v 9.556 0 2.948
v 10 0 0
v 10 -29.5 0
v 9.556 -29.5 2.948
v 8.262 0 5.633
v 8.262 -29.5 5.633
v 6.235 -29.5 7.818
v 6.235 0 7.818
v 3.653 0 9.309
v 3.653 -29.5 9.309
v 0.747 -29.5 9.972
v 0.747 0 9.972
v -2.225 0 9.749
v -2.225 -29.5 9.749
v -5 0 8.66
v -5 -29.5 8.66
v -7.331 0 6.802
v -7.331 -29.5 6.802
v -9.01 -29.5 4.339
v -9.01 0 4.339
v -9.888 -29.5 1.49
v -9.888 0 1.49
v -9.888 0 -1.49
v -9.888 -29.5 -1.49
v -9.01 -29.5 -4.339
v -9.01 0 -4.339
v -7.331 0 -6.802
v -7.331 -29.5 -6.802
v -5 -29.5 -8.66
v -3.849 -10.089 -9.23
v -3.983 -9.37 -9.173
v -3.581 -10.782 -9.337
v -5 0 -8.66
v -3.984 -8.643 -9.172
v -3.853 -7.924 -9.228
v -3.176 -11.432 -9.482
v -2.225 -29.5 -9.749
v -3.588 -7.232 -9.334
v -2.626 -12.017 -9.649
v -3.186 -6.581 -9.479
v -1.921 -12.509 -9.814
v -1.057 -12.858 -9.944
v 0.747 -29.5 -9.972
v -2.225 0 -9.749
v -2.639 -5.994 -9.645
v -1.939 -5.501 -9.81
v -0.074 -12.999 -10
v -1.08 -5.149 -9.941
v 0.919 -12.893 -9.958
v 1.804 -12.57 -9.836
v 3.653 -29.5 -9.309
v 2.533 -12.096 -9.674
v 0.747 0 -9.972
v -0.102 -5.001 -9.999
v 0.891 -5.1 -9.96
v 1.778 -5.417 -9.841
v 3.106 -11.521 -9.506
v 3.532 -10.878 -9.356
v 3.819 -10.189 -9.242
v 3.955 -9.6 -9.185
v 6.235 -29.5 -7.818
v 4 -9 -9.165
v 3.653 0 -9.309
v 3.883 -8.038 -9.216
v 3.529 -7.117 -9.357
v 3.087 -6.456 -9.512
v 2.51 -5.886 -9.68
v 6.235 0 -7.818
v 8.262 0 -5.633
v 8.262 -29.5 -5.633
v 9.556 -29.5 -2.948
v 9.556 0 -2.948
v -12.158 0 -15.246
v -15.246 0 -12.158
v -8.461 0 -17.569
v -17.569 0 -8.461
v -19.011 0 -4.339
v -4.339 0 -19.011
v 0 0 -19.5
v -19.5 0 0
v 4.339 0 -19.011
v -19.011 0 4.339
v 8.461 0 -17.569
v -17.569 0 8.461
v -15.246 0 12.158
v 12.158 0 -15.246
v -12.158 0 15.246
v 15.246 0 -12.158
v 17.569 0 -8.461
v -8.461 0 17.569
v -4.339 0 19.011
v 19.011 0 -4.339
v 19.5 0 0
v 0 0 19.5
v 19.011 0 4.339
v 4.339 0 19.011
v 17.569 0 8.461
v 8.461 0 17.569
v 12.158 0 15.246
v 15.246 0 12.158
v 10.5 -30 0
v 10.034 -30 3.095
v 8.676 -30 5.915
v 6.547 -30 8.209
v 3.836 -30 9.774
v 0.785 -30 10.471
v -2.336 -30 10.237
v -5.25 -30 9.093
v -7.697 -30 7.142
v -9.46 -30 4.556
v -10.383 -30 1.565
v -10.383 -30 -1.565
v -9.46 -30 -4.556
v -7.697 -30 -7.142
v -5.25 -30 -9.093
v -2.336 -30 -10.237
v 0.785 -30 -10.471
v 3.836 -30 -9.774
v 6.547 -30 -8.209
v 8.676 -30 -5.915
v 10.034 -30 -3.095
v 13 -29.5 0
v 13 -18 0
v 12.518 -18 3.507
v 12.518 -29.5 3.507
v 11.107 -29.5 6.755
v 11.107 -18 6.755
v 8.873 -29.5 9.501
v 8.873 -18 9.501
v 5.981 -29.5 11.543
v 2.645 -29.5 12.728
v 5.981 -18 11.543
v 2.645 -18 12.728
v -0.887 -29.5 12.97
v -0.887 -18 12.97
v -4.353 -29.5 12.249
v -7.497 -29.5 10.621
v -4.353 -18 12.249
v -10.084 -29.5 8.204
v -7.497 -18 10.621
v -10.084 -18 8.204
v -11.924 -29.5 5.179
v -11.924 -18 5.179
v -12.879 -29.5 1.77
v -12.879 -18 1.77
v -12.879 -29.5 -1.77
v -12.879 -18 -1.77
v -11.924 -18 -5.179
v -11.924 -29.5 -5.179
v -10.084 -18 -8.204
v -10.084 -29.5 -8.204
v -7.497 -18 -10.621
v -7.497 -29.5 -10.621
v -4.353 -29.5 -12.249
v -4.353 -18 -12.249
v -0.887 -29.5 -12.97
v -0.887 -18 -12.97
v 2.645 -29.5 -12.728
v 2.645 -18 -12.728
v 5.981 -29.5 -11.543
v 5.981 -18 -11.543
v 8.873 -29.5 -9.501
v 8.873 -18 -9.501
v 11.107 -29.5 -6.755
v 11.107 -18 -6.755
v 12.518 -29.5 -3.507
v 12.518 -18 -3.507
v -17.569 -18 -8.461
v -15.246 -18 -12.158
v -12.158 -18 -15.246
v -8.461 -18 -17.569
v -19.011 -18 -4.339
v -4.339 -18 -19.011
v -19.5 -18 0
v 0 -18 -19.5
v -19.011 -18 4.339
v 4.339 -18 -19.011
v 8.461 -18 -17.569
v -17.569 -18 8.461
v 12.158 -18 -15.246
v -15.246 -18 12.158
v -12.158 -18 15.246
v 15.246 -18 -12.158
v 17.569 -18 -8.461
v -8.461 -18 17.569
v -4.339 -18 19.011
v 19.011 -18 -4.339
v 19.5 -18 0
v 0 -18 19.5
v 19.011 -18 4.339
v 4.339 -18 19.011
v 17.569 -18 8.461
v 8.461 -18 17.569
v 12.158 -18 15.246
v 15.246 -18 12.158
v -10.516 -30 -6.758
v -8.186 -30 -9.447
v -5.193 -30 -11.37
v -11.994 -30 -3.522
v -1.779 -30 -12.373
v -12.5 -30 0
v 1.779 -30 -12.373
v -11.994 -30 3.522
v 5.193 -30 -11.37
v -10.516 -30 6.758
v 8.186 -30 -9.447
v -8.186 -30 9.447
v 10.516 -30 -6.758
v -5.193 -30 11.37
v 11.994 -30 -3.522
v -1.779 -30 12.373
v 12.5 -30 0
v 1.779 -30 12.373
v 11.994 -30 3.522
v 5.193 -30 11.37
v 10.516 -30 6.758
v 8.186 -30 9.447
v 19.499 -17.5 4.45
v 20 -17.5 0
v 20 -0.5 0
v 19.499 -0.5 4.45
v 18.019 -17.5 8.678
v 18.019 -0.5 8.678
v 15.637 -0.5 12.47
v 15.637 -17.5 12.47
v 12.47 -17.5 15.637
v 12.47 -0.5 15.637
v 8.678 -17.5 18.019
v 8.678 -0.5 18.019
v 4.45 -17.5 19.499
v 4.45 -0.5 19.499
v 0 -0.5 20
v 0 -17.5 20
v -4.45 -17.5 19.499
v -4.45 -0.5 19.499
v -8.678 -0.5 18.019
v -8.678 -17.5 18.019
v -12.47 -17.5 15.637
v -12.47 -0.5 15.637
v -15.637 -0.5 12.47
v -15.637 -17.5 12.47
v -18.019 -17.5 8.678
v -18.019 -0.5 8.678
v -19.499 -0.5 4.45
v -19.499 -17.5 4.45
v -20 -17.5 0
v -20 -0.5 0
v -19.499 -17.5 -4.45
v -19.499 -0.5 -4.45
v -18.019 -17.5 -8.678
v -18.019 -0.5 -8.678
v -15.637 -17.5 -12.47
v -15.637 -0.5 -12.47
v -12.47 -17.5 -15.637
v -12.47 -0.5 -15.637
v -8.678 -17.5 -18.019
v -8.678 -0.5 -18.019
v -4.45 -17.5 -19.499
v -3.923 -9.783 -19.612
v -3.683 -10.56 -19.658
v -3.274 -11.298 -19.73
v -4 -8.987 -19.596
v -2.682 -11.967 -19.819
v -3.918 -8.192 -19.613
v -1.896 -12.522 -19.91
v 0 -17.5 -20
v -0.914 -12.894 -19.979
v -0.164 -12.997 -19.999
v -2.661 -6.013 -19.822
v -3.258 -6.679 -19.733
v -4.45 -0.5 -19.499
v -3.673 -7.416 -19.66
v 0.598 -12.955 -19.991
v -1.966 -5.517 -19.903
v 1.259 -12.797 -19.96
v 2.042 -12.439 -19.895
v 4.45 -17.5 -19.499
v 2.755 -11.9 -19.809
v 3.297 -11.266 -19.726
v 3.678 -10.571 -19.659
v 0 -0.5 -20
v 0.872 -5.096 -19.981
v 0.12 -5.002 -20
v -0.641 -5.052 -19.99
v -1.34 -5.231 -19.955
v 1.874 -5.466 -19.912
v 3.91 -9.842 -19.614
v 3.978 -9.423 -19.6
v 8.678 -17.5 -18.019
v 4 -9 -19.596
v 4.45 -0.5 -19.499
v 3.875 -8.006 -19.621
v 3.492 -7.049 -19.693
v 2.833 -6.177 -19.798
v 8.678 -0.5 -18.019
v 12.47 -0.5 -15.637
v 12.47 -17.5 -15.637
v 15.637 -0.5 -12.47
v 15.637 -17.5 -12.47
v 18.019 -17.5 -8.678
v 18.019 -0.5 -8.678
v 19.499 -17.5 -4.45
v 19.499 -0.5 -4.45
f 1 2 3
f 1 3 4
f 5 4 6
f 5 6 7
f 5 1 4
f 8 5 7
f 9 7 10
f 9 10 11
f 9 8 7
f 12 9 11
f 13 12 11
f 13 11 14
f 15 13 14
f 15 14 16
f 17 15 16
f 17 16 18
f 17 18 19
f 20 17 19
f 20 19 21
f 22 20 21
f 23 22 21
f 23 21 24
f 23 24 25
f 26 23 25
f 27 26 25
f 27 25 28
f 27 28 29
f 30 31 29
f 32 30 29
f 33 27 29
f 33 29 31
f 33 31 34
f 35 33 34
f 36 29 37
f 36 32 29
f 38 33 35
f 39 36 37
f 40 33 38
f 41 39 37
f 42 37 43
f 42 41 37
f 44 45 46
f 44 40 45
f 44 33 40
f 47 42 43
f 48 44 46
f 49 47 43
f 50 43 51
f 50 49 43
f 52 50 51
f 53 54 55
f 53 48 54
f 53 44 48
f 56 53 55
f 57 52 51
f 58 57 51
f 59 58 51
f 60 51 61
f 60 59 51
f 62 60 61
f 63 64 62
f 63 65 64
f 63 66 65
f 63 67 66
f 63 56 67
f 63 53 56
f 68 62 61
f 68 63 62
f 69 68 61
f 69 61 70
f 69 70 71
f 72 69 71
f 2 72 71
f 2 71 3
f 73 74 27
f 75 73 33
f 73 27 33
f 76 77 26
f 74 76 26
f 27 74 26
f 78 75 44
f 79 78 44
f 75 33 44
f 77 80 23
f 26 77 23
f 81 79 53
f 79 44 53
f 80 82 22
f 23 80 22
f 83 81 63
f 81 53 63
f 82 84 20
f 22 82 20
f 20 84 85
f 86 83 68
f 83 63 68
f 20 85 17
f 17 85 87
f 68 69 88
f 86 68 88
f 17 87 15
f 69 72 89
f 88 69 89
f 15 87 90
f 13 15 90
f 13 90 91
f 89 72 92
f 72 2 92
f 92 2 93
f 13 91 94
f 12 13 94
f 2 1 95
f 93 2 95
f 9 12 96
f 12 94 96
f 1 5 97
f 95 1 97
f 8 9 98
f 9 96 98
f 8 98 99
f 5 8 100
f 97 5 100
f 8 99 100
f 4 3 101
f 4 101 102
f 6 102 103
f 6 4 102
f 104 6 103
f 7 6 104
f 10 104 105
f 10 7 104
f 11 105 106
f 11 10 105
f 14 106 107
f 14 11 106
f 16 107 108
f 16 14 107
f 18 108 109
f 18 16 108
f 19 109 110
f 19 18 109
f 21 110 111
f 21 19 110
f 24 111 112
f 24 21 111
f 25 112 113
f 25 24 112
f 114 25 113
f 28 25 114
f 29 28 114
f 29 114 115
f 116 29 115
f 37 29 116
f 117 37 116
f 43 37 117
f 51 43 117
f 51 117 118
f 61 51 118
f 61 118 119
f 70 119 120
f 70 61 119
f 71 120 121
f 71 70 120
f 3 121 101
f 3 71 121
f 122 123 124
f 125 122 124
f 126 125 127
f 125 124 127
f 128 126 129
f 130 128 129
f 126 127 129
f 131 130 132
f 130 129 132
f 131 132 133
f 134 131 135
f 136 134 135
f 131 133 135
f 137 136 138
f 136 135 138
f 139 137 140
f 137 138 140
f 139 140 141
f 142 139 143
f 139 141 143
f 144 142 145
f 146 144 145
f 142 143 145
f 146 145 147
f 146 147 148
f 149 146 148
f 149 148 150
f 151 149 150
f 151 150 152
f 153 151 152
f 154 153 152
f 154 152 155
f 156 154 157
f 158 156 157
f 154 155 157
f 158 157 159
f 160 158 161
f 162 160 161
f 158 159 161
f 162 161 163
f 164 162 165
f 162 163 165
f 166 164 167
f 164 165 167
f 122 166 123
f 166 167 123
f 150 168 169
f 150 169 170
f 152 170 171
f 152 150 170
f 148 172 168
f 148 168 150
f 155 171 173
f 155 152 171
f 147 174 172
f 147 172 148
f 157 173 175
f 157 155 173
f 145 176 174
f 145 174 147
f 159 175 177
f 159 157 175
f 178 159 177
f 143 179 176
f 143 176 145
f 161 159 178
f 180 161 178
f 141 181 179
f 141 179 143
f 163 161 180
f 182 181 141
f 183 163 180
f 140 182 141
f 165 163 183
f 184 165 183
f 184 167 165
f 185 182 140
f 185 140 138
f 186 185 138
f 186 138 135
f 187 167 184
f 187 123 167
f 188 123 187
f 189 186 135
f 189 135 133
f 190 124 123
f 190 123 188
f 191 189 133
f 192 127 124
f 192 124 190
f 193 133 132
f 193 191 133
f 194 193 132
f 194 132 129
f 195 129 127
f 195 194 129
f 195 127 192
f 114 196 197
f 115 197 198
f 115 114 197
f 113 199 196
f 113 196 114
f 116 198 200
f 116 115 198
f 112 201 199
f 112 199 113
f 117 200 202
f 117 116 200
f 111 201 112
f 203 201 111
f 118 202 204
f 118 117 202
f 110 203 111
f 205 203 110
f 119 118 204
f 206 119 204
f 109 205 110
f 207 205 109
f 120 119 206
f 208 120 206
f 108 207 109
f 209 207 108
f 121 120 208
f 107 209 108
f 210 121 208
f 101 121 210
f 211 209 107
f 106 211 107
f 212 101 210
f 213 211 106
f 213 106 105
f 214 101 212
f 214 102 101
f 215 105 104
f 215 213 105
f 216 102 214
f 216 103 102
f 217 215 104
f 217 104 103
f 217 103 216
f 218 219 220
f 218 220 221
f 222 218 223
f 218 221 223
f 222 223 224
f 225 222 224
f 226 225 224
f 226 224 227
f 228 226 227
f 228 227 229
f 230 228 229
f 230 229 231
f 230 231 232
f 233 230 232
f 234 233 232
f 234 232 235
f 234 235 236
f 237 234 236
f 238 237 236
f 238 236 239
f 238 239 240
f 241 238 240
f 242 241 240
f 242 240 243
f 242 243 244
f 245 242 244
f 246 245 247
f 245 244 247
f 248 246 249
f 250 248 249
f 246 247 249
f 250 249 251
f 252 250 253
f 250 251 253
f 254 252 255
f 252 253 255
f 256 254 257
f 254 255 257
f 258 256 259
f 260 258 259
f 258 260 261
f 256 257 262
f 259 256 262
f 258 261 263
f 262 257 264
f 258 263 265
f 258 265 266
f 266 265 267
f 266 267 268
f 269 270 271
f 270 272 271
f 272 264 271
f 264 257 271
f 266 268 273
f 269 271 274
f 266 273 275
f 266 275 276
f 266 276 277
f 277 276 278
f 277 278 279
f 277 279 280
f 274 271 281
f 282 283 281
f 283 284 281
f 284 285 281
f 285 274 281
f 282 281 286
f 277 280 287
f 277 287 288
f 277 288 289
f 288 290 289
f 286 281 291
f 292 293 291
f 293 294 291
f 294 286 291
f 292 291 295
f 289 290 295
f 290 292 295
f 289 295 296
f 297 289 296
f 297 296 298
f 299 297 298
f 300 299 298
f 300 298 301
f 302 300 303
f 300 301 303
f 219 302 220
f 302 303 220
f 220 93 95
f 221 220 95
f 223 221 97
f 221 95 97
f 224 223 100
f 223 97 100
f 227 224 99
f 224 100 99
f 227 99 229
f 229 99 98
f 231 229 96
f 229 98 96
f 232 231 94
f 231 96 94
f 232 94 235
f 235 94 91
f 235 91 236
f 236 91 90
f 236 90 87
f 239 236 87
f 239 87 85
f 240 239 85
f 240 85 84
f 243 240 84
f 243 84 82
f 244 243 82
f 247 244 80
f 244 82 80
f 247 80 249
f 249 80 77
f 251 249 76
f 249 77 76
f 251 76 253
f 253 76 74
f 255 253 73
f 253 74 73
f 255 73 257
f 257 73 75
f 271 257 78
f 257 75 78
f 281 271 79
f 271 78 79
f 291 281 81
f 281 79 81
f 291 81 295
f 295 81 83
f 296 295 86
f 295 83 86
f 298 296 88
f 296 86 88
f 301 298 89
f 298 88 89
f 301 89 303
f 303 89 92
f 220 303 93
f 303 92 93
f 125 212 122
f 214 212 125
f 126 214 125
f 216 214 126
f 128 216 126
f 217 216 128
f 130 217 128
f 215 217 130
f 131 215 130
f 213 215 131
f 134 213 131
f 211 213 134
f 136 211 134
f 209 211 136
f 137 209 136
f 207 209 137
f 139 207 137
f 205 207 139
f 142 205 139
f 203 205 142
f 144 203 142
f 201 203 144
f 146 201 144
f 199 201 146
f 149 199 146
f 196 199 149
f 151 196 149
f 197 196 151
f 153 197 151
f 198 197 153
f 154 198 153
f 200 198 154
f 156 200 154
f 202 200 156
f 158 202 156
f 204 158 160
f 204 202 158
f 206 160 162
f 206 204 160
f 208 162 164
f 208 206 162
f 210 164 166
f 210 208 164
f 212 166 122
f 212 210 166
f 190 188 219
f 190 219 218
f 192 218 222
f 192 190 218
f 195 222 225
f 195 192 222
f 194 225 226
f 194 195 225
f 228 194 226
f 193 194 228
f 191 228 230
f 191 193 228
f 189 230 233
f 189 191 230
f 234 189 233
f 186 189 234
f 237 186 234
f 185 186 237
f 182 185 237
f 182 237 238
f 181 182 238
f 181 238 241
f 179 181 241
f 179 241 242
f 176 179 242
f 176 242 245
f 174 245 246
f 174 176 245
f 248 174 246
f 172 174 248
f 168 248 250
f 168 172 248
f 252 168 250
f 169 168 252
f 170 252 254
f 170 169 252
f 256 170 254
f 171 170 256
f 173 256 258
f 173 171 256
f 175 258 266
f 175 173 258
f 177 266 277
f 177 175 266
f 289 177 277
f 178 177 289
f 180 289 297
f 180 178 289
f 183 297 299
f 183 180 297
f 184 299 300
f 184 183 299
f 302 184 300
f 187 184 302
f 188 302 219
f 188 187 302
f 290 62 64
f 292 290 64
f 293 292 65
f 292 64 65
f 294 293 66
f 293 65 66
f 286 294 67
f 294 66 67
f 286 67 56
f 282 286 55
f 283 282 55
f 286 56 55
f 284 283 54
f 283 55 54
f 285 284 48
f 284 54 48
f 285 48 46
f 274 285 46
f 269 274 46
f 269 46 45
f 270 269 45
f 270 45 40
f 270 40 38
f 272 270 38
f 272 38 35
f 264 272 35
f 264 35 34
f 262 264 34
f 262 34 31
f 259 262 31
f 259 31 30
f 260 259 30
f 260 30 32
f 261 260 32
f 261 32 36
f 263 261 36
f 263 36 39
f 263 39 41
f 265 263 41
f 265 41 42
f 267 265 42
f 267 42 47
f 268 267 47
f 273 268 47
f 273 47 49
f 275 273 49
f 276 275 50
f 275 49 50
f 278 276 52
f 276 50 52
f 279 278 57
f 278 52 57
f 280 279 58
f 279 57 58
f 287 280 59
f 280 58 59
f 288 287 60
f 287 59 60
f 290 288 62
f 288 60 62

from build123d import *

# Parameters (mm, degrees)
F0_R     = 20
F0_R_2   = 10
F1_DEPTH = 18
F2_R     = 4
F3_DEPTH = 25
F4_R     = 13
F4_R_2   = 10
F5_DEPTH = 12
F6_SIZE  = 0.5


with BuildPart() as f1:
    # F0 (on Front) → F1 (new body)
    with BuildSketch(Plane.XZ):
        Circle(F0_R)
        Circle(F0_R_2, mode=Mode.SUBTRACT)
    extrude(amount=F1_DEPTH)

    # F2 (on Top) → F3 (cut)
    with BuildSketch(Plane.XY):
        with Locations((0, -9)):
            Circle(F2_R)
    extrude(amount=-F3_DEPTH, mode=Mode.SUBTRACT)

    # F4 (on face) → F5 (join)
    with BuildSketch(Plane.XZ.offset(18)):
        Circle(F4_R)
        Circle(F4_R_2, mode=Mode.SUBTRACT)
    extrude(amount=F5_DEPTH)

    # F6
    f6_edges = [f1.edges().sort_by_distance(p)[0] for p in [
        (-13, -30, 0),
        (-10, -30, 0),
        (-20, -18, 0),
        (-20, 0, 0),
    ]]
    chamfer(f6_edges, length=F6_SIZE)


solid = f1.part
